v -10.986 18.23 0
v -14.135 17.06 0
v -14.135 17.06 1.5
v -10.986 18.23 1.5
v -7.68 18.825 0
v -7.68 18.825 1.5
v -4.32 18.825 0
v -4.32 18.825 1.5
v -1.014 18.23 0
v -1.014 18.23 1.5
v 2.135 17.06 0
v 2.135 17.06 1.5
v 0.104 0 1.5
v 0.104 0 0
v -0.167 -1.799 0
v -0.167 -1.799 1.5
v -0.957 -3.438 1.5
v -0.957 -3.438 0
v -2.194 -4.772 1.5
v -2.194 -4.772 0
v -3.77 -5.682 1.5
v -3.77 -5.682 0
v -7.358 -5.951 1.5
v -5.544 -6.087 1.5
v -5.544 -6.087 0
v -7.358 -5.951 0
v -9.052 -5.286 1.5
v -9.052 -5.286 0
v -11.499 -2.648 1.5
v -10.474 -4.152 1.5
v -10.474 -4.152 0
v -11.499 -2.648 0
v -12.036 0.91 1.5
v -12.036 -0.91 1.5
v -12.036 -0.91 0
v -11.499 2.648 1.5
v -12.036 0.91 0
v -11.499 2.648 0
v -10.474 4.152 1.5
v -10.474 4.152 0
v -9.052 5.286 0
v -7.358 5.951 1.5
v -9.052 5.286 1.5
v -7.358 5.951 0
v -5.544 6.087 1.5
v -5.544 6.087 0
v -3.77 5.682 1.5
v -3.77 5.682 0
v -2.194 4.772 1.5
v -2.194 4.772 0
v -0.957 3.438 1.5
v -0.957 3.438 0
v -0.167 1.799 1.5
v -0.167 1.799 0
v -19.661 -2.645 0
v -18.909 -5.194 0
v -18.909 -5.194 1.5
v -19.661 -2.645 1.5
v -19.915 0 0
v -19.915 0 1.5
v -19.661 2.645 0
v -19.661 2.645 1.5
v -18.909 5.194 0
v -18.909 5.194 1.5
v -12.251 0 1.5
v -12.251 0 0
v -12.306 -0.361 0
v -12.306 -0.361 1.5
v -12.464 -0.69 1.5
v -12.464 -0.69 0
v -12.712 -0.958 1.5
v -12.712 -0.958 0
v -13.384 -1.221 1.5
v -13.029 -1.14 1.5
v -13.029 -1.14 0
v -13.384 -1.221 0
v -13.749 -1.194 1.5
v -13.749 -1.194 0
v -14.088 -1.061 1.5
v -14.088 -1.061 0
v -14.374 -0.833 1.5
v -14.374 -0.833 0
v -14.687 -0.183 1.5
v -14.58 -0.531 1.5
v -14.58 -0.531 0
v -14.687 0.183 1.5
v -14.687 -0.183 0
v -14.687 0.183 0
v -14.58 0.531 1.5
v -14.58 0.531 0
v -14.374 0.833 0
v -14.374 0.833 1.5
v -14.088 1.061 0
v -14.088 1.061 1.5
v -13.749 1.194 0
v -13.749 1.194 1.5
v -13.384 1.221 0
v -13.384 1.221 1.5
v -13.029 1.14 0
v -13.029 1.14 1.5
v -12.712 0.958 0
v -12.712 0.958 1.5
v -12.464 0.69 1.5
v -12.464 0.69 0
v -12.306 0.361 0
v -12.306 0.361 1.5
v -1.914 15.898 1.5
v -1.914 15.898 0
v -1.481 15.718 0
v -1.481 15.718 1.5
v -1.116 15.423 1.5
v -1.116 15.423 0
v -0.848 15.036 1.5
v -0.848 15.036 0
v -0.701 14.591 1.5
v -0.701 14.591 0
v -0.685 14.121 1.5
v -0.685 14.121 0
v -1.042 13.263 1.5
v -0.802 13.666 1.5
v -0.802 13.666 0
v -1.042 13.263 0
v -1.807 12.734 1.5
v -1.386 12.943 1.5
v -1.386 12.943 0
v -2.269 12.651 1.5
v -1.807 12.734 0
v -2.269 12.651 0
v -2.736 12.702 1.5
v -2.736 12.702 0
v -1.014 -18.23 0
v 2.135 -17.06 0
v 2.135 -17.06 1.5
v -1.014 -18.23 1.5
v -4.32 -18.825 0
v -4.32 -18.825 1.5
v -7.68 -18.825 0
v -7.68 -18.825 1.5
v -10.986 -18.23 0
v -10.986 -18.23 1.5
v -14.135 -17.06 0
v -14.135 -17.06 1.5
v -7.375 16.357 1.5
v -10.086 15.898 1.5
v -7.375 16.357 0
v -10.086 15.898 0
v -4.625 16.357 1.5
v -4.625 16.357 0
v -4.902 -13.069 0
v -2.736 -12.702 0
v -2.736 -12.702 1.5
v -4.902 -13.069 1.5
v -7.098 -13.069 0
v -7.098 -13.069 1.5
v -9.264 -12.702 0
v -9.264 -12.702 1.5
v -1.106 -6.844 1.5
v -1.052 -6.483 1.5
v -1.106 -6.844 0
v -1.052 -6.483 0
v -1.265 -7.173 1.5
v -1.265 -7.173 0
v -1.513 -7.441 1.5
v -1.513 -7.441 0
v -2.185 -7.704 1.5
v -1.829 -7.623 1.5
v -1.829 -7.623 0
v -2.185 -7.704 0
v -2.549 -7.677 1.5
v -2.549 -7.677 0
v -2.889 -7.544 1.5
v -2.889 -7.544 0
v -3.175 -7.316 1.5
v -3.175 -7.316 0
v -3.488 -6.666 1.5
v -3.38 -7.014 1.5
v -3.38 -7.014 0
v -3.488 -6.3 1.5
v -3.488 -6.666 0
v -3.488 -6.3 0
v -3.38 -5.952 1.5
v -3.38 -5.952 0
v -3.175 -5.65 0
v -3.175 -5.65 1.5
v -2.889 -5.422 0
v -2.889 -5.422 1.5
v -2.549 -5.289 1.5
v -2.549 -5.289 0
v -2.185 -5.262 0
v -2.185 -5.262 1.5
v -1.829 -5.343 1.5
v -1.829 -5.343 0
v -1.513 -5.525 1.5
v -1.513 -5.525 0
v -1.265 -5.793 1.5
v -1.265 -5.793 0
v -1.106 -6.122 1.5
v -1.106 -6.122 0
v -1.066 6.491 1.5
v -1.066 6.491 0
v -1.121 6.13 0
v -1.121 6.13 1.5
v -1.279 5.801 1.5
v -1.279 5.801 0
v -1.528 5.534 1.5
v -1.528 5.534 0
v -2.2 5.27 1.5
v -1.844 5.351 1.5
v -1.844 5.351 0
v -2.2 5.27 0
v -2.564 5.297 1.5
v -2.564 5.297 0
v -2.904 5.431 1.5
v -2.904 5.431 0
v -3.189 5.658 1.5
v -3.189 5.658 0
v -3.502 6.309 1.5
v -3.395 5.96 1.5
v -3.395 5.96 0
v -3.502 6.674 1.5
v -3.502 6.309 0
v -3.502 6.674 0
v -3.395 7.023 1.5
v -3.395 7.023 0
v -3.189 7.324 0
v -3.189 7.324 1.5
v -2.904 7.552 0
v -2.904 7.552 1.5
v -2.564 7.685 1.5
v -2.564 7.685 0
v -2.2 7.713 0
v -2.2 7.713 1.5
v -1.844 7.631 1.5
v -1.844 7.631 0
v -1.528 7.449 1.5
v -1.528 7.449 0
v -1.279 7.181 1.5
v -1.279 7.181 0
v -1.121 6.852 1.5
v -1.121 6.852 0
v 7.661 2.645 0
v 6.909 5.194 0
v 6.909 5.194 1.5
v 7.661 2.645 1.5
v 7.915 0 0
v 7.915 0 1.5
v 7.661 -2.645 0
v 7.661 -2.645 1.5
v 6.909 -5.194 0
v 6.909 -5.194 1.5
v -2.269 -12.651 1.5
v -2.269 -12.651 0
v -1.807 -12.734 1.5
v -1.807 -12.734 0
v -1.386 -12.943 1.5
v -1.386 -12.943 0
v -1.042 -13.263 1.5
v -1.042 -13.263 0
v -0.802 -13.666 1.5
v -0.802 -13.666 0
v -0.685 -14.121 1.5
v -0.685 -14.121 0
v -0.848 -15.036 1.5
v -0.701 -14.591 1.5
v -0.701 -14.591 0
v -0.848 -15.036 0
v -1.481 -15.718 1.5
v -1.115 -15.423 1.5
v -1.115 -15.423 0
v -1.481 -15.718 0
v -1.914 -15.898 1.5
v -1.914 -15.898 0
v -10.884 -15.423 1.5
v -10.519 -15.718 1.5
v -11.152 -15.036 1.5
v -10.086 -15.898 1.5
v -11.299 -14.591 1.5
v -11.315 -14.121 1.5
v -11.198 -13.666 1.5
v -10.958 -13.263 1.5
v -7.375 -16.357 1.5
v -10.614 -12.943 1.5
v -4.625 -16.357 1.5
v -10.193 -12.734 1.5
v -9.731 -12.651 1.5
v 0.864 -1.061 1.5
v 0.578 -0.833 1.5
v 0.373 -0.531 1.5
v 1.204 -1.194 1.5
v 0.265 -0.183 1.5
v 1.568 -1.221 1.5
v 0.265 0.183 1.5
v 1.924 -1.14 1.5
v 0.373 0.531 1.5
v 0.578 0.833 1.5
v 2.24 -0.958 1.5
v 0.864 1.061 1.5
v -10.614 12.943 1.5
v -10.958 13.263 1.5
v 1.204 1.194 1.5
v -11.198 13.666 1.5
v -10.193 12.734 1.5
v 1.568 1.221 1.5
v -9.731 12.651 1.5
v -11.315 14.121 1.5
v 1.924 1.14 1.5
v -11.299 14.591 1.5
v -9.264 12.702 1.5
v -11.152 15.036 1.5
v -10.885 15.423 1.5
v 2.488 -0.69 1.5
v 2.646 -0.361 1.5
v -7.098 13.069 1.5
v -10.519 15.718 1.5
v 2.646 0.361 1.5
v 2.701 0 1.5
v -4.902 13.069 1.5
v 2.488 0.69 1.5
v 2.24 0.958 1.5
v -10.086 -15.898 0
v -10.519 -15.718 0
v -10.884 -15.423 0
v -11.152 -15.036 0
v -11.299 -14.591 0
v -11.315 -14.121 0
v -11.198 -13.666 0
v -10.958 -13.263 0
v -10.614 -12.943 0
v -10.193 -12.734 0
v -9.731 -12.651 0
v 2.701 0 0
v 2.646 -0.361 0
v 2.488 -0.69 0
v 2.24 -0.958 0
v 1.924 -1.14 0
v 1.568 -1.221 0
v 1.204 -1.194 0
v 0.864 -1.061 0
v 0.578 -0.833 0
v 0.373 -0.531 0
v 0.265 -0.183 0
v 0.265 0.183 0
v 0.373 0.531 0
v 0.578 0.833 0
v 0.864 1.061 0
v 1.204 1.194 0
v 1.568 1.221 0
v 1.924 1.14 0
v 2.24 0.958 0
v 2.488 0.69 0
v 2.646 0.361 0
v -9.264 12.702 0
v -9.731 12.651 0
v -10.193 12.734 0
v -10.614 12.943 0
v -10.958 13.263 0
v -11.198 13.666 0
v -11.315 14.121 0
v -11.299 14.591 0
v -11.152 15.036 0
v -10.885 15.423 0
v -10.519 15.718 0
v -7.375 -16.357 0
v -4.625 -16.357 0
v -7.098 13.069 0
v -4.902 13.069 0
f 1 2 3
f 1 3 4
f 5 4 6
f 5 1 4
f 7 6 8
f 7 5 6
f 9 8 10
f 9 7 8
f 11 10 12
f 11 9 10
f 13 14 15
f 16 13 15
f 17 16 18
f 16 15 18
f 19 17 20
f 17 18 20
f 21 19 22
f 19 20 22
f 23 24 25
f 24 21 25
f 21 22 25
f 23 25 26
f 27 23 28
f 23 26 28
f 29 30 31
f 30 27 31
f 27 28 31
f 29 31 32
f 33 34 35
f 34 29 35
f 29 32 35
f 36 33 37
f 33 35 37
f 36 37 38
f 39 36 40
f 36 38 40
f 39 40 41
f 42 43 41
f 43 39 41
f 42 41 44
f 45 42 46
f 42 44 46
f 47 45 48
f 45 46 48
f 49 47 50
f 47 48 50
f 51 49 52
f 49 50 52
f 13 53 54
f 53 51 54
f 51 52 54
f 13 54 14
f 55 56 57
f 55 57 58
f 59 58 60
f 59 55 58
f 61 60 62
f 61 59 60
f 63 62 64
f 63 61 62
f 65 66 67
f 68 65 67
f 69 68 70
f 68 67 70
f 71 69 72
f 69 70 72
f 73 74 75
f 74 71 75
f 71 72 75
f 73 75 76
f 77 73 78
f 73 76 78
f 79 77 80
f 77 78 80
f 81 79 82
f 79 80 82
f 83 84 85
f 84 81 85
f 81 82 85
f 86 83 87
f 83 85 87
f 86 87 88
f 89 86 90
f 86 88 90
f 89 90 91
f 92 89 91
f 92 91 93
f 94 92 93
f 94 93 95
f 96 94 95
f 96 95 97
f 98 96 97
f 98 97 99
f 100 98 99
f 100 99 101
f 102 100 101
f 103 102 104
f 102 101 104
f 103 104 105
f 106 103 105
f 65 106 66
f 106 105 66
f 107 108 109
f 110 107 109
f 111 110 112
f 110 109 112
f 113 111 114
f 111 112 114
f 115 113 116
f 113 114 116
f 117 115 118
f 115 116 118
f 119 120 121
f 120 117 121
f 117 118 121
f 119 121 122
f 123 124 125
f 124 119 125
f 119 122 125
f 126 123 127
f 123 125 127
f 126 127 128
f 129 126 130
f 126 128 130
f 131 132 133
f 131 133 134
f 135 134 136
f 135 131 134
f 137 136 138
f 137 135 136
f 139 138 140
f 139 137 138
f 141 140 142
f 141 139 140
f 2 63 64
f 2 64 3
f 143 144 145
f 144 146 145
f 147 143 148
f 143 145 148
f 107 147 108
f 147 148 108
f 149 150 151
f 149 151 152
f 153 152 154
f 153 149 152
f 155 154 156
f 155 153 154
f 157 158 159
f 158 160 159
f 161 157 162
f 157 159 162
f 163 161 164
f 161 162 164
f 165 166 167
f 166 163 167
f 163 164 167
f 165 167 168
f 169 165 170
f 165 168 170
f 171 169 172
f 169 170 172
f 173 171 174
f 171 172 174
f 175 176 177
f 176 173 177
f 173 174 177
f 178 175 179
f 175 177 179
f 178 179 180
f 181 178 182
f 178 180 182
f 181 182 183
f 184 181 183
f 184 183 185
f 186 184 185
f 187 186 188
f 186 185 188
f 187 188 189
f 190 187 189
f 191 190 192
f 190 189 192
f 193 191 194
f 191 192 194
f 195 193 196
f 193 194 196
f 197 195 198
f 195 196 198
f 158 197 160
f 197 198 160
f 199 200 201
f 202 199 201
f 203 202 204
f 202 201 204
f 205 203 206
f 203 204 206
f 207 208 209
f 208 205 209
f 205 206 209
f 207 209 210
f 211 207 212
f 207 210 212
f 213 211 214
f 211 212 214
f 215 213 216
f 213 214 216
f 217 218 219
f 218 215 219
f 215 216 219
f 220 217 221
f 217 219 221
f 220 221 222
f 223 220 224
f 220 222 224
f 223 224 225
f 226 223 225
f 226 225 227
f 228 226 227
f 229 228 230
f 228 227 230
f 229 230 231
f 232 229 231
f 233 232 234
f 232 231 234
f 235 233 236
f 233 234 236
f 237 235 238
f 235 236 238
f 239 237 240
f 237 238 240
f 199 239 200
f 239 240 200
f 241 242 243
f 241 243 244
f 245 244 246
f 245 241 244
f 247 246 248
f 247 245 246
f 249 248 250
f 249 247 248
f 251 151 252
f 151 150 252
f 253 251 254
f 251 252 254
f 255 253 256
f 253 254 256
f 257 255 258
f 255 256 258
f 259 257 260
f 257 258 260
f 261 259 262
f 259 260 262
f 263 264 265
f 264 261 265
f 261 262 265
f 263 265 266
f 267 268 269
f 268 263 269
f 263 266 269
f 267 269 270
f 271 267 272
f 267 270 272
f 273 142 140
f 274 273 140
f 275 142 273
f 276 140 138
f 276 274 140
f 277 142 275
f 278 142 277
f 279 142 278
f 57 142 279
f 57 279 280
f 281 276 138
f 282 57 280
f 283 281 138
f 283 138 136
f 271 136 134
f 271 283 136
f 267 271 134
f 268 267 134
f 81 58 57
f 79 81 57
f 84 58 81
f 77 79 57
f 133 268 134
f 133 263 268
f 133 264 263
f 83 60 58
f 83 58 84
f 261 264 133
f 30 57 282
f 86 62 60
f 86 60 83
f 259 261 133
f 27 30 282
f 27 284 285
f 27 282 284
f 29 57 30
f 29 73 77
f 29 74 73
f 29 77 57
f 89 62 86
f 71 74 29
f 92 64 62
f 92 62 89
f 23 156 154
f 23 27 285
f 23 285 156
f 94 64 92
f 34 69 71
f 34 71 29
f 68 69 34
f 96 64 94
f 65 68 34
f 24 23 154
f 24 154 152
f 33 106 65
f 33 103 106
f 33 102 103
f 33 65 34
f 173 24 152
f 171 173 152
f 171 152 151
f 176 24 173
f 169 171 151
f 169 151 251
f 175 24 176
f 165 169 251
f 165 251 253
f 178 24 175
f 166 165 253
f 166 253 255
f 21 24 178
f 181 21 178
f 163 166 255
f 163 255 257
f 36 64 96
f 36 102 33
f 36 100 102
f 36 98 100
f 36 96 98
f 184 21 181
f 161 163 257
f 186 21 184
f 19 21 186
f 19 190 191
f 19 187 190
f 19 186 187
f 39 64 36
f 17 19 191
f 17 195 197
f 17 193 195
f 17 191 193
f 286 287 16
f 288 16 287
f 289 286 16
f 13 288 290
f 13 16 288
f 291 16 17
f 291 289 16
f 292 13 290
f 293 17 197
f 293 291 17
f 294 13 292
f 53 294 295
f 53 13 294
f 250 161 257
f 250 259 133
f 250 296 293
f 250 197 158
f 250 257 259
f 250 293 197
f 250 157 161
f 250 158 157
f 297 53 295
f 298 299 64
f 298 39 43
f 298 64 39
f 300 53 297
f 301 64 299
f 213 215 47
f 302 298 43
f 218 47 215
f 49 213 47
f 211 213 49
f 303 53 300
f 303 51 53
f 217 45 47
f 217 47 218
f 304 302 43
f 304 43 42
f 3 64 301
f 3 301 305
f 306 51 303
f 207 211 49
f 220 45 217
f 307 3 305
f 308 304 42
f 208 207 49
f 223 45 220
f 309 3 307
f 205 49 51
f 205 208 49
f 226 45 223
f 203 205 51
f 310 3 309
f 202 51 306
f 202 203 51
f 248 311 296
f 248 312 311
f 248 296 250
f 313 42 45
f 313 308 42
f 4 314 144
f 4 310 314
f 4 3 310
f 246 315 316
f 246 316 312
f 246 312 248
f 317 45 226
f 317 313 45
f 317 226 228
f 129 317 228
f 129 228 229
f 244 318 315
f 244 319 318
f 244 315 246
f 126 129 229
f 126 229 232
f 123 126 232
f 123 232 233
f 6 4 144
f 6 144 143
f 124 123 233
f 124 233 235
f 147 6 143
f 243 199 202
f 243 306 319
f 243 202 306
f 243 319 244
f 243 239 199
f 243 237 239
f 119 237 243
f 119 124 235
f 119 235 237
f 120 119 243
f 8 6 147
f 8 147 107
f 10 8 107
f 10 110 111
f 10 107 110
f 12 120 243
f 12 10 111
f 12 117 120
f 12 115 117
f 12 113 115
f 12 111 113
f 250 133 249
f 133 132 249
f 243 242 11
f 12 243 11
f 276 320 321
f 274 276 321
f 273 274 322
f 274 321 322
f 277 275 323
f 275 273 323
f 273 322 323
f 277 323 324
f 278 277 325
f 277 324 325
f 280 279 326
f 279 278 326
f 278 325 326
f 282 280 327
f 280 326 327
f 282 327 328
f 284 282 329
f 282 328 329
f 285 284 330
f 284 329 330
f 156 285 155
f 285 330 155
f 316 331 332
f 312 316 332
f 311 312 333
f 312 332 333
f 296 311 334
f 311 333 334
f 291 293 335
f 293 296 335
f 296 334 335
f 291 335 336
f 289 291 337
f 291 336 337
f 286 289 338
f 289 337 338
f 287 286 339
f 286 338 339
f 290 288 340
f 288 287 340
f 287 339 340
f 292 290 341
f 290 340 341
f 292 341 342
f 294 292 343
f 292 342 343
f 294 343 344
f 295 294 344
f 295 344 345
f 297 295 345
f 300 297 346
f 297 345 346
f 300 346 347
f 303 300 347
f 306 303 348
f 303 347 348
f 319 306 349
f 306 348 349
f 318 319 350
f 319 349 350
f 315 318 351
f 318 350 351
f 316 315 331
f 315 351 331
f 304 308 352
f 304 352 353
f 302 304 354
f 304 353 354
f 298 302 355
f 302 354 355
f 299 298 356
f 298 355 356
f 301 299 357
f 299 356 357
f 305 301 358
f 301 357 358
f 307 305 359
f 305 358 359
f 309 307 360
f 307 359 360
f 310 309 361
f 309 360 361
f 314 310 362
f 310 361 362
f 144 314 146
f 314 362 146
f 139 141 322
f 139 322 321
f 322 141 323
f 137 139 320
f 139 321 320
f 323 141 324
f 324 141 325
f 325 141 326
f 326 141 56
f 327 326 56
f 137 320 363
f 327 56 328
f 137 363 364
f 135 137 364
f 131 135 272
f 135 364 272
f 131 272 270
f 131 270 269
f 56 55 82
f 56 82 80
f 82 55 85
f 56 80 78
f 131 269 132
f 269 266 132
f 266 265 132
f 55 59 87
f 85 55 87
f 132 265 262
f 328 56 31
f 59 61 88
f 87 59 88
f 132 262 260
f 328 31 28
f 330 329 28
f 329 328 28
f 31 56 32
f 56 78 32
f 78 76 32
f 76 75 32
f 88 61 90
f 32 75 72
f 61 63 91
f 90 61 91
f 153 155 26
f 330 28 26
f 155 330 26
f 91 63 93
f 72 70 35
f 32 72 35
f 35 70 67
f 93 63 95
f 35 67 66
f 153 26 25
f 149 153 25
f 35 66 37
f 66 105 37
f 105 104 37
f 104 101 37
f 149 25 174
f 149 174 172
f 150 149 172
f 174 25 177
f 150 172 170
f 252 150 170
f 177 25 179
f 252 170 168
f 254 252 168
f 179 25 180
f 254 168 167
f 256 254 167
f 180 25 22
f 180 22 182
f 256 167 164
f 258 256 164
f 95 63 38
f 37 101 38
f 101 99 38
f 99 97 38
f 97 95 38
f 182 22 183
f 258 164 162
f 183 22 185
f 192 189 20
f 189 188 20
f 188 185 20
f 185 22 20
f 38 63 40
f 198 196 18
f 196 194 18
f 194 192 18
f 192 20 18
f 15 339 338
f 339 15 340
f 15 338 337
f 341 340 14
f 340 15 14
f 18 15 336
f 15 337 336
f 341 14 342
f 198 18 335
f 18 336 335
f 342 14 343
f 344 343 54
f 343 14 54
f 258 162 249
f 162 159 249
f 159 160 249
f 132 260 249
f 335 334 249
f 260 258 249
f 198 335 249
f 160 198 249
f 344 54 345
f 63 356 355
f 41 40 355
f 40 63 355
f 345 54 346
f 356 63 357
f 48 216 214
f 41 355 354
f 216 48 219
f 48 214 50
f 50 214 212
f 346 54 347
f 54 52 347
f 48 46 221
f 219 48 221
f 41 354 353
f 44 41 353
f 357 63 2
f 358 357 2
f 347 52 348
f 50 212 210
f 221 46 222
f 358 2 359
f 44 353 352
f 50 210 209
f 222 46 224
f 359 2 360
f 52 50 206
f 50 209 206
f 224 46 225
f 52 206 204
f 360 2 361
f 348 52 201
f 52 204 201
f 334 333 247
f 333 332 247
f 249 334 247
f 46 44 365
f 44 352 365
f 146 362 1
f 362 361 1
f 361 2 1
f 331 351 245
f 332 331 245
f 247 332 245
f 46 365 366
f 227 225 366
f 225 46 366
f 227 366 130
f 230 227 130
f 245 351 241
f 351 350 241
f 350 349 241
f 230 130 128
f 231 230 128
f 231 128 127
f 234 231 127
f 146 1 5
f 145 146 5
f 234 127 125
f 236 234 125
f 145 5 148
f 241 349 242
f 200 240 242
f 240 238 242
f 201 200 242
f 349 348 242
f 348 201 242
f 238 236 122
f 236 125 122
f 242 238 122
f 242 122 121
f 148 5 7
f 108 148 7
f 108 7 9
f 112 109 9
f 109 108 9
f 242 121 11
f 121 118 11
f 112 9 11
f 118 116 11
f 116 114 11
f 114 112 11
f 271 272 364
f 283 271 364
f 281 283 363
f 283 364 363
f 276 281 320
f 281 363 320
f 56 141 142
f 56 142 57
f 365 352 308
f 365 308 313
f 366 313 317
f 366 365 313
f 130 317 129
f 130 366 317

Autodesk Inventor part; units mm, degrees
ref_plane "YZ Plane" through (0, 0, 0) normal (1, 0, 0) x (0, 1, 0)
ref_plane "XZ Plane" through (0, 0, 0) normal (0, 1, 0) x (-1, 0, 0)
ref_plane "XY Plane" through (0, 0, 0) normal (0, 0, 1) x (1, 0, 0)
sketch "Эскиз1" plane through (0, 0, 0) normal (0, 0, 1) x (1, 0, 0)
  line L0 (6.9092, 5.1942) -> (2.135, 17.0596)
  arc A0 (2.135, 17.0596) -> (-14.135, 17.0596) centre (-6, 0) ccw
  line L1 (-18.9092, 5.1942) -> (-14.135, 17.0596)
  arc A1 (-18.9092, 5.1942) -> (-18.9092, -5.1942) centre (-6, 0) ccw
  line L2 (-14.135, -17.0597) -> (-18.9092, -5.1942)
  arc A2 (-14.135, -17.0597) -> (2.135, -17.0597) centre (-6, 0) ccw
  line L3 (2.135, -17.0597) -> (6.9092, -5.1942)
  arc A3 (6.9092, -5.1942) -> (6.9092, 5.1942) centre (-6, 0) ccw
  circle A4 centre (-6, 0) radius 6.1038
  arc A5 (-2.7357, 12.7023) -> (-1.9143, 15.8984) centre (-2.325, 14.3003) ccw
  arc A6 (-2.7357, 12.7023) -> (-9.2643, 12.7023) centre (-6, 0) ccw
  arc A7 (-10.0857, 15.8984) -> (-9.2643, 12.7023) centre (-9.675, 14.3003) ccw
  arc A8 (-1.9143, 15.8984) -> (-10.0857, 15.8984) centre (-6, 0) ccw
  arc A9 (-9.2643, -12.7023) -> (-10.0857, -15.8984) centre (-9.675, -14.3003) ccw
  arc A10 (-9.2643, -12.7023) -> (-2.7357, -12.7023) centre (-6, 0) ccw
  arc A11 (-1.9143, -15.8984) -> (-2.7357, -12.7023) centre (-2.325, -14.3003) ccw
  arc A12 (-10.0857, -15.8984) -> (-1.9143, -15.8984) centre (-6, 0) ccw
  circle A13 centre (-13.476, 0) radius 1.2248
  circle A14 centre (-2.2767, -6.483) radius 1.2248
  circle A15 centre (1.4761, 0) radius 1.2248
  circle A16 centre (-2.2913, 6.4913) radius 1.2248
  point P0 (0, 0)
  point P1 (-8.8708, 4.3525)
extrude "Выдавливание1" add sketch "Эскиз1" along normal blind 1.5
properties part number "Фланец"
